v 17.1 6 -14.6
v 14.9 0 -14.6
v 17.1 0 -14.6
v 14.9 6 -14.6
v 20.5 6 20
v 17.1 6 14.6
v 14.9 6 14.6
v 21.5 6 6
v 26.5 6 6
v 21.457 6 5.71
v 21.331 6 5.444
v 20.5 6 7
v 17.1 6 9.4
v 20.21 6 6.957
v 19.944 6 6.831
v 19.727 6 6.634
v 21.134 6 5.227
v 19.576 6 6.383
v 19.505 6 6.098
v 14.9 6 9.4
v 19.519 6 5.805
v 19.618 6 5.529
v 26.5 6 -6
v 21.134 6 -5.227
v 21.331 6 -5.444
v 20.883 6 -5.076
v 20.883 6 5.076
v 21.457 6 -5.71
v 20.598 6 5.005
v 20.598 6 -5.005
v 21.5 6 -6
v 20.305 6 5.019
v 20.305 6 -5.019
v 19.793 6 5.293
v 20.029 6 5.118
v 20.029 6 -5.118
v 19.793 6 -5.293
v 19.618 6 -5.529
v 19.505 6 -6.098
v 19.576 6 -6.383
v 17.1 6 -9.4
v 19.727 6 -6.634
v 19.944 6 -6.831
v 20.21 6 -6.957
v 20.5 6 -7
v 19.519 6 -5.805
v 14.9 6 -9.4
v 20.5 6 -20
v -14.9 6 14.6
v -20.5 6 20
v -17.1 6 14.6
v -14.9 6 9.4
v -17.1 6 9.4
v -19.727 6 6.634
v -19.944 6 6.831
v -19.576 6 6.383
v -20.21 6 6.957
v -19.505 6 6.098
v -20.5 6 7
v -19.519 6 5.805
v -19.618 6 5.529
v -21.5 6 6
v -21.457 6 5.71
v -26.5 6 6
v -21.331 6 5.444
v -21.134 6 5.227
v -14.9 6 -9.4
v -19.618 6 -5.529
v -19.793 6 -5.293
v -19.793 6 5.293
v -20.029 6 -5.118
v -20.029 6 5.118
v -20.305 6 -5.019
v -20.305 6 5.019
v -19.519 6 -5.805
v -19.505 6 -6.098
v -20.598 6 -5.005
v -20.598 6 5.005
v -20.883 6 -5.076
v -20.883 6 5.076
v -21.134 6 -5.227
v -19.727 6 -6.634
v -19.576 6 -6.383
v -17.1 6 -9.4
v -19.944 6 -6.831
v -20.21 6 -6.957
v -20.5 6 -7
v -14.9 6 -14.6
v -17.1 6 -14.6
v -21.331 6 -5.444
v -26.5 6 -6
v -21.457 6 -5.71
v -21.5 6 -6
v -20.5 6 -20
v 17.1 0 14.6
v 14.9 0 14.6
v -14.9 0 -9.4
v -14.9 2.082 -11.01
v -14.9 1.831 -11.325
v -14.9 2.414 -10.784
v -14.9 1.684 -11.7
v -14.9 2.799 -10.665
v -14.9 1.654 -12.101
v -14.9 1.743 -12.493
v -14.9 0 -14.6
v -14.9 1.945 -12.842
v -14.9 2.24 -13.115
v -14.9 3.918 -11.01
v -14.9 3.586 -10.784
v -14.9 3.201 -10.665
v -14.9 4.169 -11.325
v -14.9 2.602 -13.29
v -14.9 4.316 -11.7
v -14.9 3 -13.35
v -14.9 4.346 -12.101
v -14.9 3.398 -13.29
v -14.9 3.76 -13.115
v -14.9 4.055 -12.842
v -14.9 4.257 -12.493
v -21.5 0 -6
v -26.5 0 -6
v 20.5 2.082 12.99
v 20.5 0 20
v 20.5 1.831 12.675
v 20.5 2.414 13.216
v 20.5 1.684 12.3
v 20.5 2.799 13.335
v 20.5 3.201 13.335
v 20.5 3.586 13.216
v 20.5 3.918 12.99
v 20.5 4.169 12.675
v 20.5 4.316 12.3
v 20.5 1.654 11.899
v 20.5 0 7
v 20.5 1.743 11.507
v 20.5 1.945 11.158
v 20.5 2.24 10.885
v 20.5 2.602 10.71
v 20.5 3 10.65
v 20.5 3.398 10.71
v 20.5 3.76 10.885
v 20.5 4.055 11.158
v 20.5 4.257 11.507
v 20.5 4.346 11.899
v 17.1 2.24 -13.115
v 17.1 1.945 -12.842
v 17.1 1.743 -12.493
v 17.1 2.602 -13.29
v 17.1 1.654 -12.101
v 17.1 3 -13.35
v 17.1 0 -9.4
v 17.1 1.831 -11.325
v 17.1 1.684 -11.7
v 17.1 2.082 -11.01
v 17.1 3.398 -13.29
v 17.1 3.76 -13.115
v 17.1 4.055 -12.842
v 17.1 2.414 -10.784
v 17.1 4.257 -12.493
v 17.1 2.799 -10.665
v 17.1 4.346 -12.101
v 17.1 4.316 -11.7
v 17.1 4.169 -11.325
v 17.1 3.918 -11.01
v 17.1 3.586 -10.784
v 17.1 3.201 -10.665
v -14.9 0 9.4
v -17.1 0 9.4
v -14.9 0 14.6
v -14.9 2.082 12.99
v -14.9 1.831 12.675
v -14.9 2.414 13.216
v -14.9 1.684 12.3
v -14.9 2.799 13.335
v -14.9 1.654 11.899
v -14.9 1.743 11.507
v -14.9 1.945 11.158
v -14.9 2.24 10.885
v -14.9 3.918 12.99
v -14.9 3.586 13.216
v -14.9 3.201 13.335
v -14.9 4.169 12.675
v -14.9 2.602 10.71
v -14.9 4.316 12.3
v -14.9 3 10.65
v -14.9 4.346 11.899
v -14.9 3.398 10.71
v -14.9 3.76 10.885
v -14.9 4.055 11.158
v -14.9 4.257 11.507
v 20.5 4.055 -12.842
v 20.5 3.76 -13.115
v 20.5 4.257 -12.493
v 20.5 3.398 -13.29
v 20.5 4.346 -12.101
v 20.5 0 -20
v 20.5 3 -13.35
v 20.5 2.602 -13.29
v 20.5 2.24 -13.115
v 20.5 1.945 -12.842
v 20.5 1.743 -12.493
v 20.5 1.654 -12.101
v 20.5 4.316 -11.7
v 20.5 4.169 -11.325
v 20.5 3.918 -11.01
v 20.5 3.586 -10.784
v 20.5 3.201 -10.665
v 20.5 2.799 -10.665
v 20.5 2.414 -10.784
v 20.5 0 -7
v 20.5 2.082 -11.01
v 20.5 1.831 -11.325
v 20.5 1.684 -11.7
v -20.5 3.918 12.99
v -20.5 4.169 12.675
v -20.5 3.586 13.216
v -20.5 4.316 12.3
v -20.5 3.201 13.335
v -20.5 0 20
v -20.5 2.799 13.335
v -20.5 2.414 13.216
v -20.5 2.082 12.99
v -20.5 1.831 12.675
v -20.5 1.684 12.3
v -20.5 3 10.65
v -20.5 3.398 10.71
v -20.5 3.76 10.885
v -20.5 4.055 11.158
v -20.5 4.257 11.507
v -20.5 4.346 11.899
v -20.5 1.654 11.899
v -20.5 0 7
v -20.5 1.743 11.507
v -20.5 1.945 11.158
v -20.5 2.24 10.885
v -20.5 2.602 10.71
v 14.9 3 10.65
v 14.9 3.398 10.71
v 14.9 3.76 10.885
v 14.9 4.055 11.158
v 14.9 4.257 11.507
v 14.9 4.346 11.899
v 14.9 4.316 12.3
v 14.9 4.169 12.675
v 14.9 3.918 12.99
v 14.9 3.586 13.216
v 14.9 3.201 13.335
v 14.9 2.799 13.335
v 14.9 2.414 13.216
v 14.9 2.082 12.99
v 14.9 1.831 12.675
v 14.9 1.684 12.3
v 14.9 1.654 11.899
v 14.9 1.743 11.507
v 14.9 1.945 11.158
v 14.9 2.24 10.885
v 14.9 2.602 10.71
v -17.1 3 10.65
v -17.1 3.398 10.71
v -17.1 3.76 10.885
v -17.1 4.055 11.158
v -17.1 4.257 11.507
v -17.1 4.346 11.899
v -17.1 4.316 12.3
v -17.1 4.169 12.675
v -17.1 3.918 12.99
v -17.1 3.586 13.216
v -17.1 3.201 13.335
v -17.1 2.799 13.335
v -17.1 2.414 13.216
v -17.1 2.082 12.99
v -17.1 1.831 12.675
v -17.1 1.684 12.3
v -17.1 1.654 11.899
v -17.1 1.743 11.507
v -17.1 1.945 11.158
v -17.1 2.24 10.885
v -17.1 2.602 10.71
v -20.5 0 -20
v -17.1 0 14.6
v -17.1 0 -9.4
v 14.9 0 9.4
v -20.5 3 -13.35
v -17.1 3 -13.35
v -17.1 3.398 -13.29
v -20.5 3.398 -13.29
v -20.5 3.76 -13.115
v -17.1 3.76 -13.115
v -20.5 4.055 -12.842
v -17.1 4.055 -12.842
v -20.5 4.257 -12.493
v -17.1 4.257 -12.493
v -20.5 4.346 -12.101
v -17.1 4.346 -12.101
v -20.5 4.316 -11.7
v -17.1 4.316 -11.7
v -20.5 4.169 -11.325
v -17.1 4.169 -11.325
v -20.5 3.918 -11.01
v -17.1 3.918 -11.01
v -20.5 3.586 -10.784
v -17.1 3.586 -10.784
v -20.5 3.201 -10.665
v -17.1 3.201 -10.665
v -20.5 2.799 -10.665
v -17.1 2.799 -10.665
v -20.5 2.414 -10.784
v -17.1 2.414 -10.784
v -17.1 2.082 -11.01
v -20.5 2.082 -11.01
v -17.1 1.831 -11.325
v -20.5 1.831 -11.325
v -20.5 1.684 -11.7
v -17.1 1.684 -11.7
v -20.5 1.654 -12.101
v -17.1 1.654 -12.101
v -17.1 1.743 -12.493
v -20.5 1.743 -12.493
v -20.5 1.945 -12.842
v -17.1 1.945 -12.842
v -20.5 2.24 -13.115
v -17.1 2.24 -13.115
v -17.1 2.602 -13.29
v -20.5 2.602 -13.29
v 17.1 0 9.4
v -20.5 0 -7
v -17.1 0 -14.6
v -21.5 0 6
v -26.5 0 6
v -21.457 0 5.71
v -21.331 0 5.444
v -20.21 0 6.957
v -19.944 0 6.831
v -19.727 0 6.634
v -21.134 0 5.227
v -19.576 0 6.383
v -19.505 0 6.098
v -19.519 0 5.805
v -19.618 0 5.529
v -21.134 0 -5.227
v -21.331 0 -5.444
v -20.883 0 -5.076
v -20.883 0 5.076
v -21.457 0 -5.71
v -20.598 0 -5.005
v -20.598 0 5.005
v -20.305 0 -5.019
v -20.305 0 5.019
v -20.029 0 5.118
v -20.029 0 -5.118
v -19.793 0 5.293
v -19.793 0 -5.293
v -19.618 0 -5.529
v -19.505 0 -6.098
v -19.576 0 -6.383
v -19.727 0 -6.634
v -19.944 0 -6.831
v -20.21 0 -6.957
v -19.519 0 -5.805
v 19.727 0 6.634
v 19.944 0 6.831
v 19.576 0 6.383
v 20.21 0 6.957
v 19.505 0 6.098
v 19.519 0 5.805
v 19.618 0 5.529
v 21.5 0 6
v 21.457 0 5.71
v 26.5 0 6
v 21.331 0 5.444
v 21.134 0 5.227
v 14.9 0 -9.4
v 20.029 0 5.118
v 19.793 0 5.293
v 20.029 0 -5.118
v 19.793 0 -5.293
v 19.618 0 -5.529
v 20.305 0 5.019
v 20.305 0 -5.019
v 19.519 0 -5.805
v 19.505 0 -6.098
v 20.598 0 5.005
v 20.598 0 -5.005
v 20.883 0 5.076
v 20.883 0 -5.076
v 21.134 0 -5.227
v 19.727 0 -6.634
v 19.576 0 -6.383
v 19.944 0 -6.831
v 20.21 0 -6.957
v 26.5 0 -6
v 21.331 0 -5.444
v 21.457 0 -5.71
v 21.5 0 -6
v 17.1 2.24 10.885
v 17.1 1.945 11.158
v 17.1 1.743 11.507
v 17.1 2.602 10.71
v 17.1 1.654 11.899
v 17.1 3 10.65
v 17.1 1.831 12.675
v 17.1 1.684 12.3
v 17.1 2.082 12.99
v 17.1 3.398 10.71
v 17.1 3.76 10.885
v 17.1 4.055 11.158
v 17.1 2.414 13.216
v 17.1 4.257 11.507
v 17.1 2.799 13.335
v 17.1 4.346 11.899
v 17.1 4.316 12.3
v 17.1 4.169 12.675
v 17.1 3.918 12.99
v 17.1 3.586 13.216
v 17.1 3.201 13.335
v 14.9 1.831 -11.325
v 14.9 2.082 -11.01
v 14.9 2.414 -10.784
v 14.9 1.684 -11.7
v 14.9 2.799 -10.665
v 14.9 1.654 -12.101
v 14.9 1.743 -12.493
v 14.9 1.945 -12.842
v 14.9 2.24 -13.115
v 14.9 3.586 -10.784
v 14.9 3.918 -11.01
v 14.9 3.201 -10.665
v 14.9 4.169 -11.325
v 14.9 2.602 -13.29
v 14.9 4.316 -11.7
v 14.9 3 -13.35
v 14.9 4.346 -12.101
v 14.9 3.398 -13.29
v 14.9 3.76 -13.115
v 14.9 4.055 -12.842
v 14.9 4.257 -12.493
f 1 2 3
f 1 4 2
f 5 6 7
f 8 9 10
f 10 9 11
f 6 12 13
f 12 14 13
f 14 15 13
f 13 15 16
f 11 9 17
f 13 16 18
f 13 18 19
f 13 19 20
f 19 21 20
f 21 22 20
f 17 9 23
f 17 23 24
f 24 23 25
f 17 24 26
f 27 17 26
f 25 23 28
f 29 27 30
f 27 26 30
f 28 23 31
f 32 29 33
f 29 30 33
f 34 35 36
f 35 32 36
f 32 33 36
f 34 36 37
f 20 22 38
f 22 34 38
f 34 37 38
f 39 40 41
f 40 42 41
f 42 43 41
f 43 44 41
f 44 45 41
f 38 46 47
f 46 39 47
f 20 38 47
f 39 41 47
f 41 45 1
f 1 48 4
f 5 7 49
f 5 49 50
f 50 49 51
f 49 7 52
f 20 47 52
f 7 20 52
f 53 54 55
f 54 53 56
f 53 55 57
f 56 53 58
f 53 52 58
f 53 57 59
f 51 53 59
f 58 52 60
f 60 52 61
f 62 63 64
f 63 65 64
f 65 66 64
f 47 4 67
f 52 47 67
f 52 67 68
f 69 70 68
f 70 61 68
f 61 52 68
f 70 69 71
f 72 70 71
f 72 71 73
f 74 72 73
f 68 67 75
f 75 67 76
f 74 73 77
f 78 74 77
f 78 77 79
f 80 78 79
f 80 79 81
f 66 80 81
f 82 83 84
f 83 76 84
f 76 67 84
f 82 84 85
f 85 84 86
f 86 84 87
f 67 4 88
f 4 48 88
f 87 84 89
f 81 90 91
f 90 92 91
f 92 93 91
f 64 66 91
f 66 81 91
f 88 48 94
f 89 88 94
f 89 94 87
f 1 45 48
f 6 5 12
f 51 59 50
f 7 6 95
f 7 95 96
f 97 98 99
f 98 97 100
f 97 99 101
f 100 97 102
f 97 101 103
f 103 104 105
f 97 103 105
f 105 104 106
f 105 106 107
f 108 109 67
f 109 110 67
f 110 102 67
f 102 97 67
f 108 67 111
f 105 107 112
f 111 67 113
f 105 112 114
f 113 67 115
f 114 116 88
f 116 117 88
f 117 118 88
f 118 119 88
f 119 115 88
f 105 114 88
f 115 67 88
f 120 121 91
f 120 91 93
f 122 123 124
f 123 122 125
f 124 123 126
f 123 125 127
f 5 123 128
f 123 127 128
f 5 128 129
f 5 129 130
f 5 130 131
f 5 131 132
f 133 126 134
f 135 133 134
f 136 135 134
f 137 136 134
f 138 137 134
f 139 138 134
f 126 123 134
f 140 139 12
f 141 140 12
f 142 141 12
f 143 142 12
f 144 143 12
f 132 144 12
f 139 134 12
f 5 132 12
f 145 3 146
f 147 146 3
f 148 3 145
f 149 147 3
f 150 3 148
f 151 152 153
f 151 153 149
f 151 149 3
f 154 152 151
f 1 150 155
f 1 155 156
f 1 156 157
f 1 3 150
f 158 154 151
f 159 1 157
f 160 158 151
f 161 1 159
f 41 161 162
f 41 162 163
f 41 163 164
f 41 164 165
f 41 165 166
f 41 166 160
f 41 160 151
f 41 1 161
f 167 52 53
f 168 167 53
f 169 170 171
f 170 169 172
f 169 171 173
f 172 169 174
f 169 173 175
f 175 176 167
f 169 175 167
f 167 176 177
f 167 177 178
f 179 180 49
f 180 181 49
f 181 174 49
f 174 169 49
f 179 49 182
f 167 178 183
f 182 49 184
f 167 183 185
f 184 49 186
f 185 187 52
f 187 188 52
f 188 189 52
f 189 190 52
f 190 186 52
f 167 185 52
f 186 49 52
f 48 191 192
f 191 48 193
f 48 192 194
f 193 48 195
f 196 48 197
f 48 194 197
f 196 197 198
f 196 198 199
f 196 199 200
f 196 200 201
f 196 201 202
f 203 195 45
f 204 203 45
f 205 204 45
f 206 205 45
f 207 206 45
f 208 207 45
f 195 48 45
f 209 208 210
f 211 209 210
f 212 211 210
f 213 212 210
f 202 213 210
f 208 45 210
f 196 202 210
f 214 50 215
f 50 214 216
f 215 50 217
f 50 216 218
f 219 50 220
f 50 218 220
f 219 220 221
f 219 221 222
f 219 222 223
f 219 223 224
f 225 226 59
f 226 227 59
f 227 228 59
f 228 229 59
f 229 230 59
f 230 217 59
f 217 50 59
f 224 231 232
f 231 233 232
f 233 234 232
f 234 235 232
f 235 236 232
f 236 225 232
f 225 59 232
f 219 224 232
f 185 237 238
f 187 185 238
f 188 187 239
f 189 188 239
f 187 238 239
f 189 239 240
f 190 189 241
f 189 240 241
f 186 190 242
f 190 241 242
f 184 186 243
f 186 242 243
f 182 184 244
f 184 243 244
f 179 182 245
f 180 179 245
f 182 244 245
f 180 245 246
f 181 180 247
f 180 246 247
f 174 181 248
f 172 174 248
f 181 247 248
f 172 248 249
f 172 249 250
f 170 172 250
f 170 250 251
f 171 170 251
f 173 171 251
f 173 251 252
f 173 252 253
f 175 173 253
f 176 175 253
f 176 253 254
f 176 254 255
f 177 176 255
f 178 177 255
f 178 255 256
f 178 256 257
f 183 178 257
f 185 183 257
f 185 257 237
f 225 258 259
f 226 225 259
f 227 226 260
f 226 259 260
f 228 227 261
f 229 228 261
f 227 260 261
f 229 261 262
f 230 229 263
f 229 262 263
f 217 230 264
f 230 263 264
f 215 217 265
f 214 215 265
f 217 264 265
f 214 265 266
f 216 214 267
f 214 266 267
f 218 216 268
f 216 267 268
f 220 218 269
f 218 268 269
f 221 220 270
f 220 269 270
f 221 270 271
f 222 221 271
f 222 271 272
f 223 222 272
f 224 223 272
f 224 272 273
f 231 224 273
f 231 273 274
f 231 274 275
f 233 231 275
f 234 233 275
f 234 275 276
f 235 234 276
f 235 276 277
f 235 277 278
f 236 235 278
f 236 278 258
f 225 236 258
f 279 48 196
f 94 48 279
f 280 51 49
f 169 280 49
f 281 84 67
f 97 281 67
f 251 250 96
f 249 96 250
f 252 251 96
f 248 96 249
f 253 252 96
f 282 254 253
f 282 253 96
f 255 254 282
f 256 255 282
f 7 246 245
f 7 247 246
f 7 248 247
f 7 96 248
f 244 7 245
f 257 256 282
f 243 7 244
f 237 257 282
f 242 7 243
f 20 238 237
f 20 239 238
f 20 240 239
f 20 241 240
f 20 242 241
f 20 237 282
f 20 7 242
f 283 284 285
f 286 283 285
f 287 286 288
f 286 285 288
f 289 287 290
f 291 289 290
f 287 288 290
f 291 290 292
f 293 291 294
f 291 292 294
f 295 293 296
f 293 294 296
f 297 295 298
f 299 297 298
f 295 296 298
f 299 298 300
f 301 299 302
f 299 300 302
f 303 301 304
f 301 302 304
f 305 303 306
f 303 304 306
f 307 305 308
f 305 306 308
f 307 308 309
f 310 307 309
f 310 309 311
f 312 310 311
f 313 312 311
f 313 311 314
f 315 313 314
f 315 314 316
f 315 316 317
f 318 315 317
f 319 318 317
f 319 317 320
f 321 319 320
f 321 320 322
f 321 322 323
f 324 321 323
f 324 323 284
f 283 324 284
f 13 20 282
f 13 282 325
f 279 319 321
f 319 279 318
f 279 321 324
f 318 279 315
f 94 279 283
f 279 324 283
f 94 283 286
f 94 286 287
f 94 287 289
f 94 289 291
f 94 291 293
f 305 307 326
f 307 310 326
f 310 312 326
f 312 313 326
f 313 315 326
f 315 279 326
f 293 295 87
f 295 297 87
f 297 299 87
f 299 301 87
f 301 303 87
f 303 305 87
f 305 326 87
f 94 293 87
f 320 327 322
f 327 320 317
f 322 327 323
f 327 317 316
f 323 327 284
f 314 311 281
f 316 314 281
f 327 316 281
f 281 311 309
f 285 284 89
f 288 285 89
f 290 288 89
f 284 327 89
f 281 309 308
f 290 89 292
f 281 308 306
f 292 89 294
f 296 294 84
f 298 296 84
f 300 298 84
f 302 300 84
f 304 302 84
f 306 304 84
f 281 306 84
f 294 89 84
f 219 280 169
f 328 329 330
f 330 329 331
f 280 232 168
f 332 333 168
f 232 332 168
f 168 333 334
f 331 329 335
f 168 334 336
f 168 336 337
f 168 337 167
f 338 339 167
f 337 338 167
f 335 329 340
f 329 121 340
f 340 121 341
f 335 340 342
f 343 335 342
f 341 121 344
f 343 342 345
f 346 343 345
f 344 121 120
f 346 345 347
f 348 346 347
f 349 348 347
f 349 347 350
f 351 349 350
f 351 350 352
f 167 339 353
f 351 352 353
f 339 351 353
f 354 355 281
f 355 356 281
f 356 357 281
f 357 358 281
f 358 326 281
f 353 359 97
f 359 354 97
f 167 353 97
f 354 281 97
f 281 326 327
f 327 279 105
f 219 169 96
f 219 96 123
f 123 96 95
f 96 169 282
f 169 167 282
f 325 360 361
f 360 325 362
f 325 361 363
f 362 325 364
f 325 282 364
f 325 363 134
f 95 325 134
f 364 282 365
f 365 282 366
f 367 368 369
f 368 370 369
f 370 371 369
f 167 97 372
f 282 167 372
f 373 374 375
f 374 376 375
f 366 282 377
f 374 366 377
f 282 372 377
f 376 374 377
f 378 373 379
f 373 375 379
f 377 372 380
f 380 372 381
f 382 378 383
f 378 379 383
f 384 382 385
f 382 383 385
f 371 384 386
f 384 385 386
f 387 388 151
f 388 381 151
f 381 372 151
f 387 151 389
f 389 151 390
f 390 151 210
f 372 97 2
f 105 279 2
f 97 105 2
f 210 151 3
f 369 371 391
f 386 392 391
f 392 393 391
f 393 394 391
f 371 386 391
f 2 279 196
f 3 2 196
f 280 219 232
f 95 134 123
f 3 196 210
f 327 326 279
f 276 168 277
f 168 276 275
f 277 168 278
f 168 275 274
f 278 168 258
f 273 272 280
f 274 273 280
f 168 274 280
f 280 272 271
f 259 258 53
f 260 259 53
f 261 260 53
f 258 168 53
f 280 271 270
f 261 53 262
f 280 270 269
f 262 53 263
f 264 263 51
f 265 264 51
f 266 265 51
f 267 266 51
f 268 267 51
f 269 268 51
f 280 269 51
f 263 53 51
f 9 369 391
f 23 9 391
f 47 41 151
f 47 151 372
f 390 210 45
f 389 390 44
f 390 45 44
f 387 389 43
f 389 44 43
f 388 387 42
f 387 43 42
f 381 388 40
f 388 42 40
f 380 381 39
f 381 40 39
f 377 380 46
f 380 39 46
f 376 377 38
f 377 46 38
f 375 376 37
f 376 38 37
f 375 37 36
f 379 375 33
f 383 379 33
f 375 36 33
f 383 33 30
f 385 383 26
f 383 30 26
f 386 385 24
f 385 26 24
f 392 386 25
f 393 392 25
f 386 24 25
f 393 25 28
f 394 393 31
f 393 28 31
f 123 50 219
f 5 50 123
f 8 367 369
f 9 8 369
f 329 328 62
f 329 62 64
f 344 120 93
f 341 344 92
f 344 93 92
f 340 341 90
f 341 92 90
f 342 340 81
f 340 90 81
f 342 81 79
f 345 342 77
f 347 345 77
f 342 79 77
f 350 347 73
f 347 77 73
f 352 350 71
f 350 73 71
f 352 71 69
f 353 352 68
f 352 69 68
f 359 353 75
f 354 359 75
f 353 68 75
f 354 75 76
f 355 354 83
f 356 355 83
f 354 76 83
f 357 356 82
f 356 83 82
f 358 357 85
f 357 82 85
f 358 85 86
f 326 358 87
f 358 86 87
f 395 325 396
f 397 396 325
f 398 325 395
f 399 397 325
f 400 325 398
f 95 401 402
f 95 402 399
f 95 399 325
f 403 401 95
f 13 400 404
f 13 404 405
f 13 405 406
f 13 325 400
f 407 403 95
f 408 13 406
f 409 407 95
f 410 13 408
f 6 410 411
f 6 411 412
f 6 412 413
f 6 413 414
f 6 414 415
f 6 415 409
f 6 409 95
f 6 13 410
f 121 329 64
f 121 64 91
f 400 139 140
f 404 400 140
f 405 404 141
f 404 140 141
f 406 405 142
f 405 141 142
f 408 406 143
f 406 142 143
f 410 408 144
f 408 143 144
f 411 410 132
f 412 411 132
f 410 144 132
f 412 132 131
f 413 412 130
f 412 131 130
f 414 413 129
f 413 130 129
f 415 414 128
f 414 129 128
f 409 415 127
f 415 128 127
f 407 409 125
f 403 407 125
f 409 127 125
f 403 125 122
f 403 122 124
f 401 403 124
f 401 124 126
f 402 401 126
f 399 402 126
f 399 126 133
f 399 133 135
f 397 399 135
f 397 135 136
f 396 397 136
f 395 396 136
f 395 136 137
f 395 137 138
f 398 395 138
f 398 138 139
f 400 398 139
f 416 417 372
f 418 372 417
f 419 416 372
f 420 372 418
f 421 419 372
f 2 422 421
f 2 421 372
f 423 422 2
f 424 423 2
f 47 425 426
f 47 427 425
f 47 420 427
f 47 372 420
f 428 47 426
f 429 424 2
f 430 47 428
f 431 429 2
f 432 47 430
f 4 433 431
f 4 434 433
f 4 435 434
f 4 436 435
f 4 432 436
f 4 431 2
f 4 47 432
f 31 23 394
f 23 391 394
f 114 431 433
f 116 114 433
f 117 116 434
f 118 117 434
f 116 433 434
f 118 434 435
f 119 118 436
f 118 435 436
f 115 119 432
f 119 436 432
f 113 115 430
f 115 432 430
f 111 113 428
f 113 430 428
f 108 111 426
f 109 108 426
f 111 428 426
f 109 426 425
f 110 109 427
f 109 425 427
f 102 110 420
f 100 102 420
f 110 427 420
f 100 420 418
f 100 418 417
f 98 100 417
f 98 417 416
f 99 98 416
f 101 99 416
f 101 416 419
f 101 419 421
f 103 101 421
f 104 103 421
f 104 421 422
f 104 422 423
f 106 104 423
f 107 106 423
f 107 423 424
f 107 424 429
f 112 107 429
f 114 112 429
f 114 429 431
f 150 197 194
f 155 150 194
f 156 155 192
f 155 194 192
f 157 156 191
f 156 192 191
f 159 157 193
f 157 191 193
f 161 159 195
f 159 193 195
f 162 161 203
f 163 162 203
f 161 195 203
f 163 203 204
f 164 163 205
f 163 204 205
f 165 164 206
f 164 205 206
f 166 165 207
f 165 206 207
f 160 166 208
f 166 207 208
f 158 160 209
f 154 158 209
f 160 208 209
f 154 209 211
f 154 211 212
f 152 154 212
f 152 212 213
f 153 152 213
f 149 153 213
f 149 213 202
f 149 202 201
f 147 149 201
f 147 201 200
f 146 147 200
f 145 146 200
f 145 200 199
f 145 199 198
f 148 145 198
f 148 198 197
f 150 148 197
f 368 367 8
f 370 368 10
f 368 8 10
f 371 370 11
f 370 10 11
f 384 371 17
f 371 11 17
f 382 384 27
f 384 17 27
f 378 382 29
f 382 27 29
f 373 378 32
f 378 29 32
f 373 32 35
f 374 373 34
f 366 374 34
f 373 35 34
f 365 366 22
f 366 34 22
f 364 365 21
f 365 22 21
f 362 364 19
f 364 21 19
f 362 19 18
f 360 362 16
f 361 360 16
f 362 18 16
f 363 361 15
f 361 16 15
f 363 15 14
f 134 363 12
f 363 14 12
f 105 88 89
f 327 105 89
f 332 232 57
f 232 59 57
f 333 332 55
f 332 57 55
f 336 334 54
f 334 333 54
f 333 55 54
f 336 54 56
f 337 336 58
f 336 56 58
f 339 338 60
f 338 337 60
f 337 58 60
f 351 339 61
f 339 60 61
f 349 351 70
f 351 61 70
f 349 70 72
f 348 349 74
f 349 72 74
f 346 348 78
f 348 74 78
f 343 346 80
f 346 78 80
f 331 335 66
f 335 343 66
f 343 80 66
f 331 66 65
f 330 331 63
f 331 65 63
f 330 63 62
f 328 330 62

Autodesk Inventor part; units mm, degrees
ref_plane "우측면도" through (0, 0, 0) normal (1, 0, 0) x (0, 1, 0)
ref_plane "평면도" through (0, 0, 0) normal (0, 1, 0) x (-1, 0, 0)
ref_plane "정면도" through (0, 0, 0) normal (0, 0, 1) x (1, 0, 0)
sketch "스케치1" plane through (0, 0, 0) normal (0, 1, 0) x (-1, 0, 0)
  line L0 (-20.5, 15) -> (20.5, 15)
  line L1 (20.5, 15) -> (20.5, -15)
  line L2 (20.5, -15) -> (-20.5, -15)
  line L3 (-20.5, -15) -> (-20.5, 15)
  line L4 (-20.5, 15) -> (20.5, -15) construction
  line L5 (20.5, 15) -> (-20.5, -15) construction
  line L6 (9, -15) -> (-9, -15)
  line L7 (9, 15) -> (-9, 15)
  line L8 (20.5, -3) -> (20.5, 15)
  line L9 (-20.5, -3) -> (-20.5, 15)
  line L10 (20.5, 6) -> (26.5, 6)
  line L11 (26.5, 6) -> (26.5, -6)
  line L12 (26.5, -6) -> (20.5, -6)
  line L13 (20.5, -6) -> (20.5, 6)
  line L14 (-20.5, 6) -> (-26.5, 6)
  line L15 (-26.5, 6) -> (-26.5, -6)
  line L16 (-26.5, -6) -> (-20.5, -6)
  line L17 (-20.5, -6) -> (-20.5, 6)
  point P0 (0, 0)
  dimension "d0" = 41
  dimension "d1" = 30
  dimension "d16" = 6
  dimension "d17" = 12
  dimension "d18" = 6
  dimension "d19" = 12
extrude "돌출3" add sketch "스케치1" along normal blind 6
sketch "스케치3" plane through (26.5, 0, 6) normal (1, 0, 0) x (0, 0, -1)
  circle A0 centre (18, 3) radius 1.35
  circle A1 centre (-6, 3) radius 1.35
  point P0 (6, 0)
  dimension "d22" = 2.7
  dimension "d23" = 2.7
extrude "돌출4" cut sketch "스케치3" against normal blind 100
sketch "스케치4" plane through (0, 6, 0) normal (0, 1, 0) x (1, 0, 0)
  line L0 (20.5, -10.65) -> (-20.5, -10.65) projected
  line L1 (20.5, -13.35) -> (-20.5, -13.35) projected
  line L2 (20.5, 10.65) -> (-20.5, 10.65) projected
  line L3 (20.5, 13.35) -> (-20.5, 13.35) projected
  line L4 (16, -13.35) -> (42.7, -13.35) construction
  line L5 (16, -13.35) -> (16, -10.65)
  line L6 (16, 10.65) -> (16, 13.35)
  line L7 (17.1, -14.6) -> (14.9, -14.6)
  line L8 (14.9, -14.6) -> (14.9, -9.4)
  line L9 (14.9, -9.4) -> (17.1, -9.4)
  line L10 (17.1, -9.4) -> (17.1, -14.6)
  line L11 (17.1, -14.6) -> (14.9, -9.4) construction
  line L12 (14.9, -14.6) -> (17.1, -9.4) construction
  line L13 (-17.1, -14.6) -> (-14.9, -14.6)
  line L14 (-14.9, -14.6) -> (-14.9, -9.4)
  line L15 (-14.9, -9.4) -> (-17.1, -9.4)
  line L16 (-17.1, -9.4) -> (-17.1, -14.6)
  line L17 (-17.1, -14.6) -> (-14.9, -9.4) construction
  line L18 (-14.9, -14.6) -> (-17.1, -9.4) construction
  line L19 (-14.9, 14.6) -> (-17.1, 14.6)
  line L20 (-17.1, 14.6) -> (-17.1, 9.4)
  line L21 (-17.1, 9.4) -> (-14.9, 9.4)
  line L22 (-14.9, 9.4) -> (-14.9, 14.6)
  line L23 (-14.9, 14.6) -> (-17.1, 9.4) construction
  line L24 (-17.1, 14.6) -> (-14.9, 9.4) construction
  line L25 (17.1, 9.4) -> (14.9, 9.4)
  line L26 (14.9, 9.4) -> (14.9, 14.6)
  line L27 (14.9, 14.6) -> (17.1, 14.6)
  line L28 (17.1, 14.6) -> (17.1, 9.4)
  line L29 (17.1, 9.4) -> (14.9, 14.6) construction
  line L30 (14.9, 9.4) -> (17.1, 14.6) construction
  point P0 (0, 0)
  point P1 (16, -12)
  point P2 (-16, -12)
  point P3 (-16, 12)
  point P4 (16, 12)
  dimension "d39" = 5
  dimension "d27" = 2.2
  dimension "d28" = 5.2
  dimension "d29" = 2.2
  dimension "d30" = 5.2
  dimension "d31" = 2.2
  dimension "d32" = 5.2
  dimension "d33" = 2.2
  dimension "d34" = 5.2
extrude "돌출5" cut sketch "스케치4" against normal blind 100 contours L10 L1 L5 L0 | L0 L8 L9 L10 | L5 L1 L8 L0 | L10 L7 L8 L1 | L14 L1 L16 L0 | L0 L16 L15 L14 | L14 L13 L16 L1 | L28 L25 L26 L2 | L2 L6 L3 L28 | L2 L26 L3 L6 | L3 L26 L27 L28 | L22 L21 L20 L2 | L2 L20 L3 L22 | L3 L20 L19 L22
sketch "스케치5" plane through (20.5, 0, -15) normal (0, 0, -1) x (-1, 0, 0)
  line L0 (0, 0) -> (41, 0)
  line L1 (41, 0) -> (41, 6)
  line L2 (41, 6) -> (0, 6)
  line L3 (0, 6) -> (0, 0)
  point P0 (20.5, 0)
  dimension "d37" = 41
  dimension "d38" = 6
extrude "돌출6" add sketch "스케치5" along normal blind 5
sketch "스케치6" plane through (-20.5, 0, 15) normal (0, 0, 1) x (1, 0, 0)
  line L0 (0, 0) -> (41, 0)
  line L1 (41, 0) -> (41, 6)
  line L2 (41, 6) -> (0, 6)
  line L3 (0, 6) -> (0, 0)
  point P0 (20.5, 0)
  dimension "d41" = 41
  dimension "d42" = 6
extrude "돌출7" add sketch "스케치6" along normal blind 5
sketch "스케치7" plane through (0, 6, 0) normal (0, 1, 0) x (1, 0, 0)
  line L0 (17.1, 14.6) -> (17.1, 9.4) projected
  line L1 (17.1, 9.4) -> (14.9, 9.4) projected
  line L2 (14.9, 9.4) -> (14.9, 14.6) projected
  line L3 (14.9, 14.6) -> (17.1, 14.6) projected
  line L4 (-14.9, -9.4) -> (-14.9, -14.6) projected
  line L5 (-14.9, -14.6) -> (-17.1, -14.6) projected
  line L6 (-17.1, -14.6) -> (-17.1, -9.4) projected
  line L7 (-17.1, -9.4) -> (-14.9, -9.4) projected
  line L8 (-17.1, 14.6) -> (-14.9, 14.6) projected
  line L9 (-14.9, 14.6) -> (-14.9, 9.4) projected
  line L10 (-14.9, 9.4) -> (-17.1, 9.4) projected
  line L11 (-17.1, 9.4) -> (-17.1, 14.6) projected
  line L12 (17.1, -9.4) -> (17.1, -14.6) projected
  line L13 (17.1, -14.6) -> (14.9, -14.6) projected
  line L14 (14.9, -14.6) -> (14.9, -9.4) projected
  line L15 (14.9, -9.4) -> (17.1, -9.4) projected
  line L16 (-20.5, 6) -> (-20.5, 20) projected
  line L17 (-20.5, 6) -> (-26.5, 6) projected
  line L18 (-26.5, 6) -> (-26.5, -6) projected
  line L19 (-26.5, -6) -> (-20.5, -6) projected
  line L20 (-20.5, -6) -> (-20.5, -20) projected
  line L21 (20.5, -20) -> (-20.5, -20) projected
  line L22 (20.5, -6) -> (20.5, -20) projected
  line L23 (20.5, -6) -> (26.5, -6) projected
  line L24 (26.5, -6) -> (26.5, 6) projected
  line L25 (26.5, 6) -> (20.5, 6) projected
  line L26 (20.5, 6) -> (20.5, 20) projected
  line L27 (-20.5, 20) -> (20.5, 20) projected
  circle A0 centre (-20.5, 6) radius 1
  circle A1 centre (-20.5, -6) radius 1
  circle A2 centre (20.5, 6) radius 1
  circle A3 centre (20.5, -6) radius 1
  point P0 (0, 0)
  point P1 (-21.5, -6)
  point P2 (-20.5, -7)
  point P3 (20.5, -7)
  point P4 (21.5, -6)
  point P5 (21.5, 6)
  point P6 (20.5, 7)
  point P7 (-20.5, 7)
  point P8 (-21.5, 6)
  dimension "d45" = 2
  dimension "d46" = 2
  dimension "d47" = 2
  dimension "d48" = 2
extrude "돌출9" cut sketch "스케치7" against normal blind 10 contours L17 A0 L16 | L16 A0 L17 | A2 L25 L26 | L26 L25 A2 | A1 L20 L19 | L19 L20 A1 | A3 L22 L23 | L23 L22 A3
properties part number "hand connection" material "PMMA 플라스틱"
